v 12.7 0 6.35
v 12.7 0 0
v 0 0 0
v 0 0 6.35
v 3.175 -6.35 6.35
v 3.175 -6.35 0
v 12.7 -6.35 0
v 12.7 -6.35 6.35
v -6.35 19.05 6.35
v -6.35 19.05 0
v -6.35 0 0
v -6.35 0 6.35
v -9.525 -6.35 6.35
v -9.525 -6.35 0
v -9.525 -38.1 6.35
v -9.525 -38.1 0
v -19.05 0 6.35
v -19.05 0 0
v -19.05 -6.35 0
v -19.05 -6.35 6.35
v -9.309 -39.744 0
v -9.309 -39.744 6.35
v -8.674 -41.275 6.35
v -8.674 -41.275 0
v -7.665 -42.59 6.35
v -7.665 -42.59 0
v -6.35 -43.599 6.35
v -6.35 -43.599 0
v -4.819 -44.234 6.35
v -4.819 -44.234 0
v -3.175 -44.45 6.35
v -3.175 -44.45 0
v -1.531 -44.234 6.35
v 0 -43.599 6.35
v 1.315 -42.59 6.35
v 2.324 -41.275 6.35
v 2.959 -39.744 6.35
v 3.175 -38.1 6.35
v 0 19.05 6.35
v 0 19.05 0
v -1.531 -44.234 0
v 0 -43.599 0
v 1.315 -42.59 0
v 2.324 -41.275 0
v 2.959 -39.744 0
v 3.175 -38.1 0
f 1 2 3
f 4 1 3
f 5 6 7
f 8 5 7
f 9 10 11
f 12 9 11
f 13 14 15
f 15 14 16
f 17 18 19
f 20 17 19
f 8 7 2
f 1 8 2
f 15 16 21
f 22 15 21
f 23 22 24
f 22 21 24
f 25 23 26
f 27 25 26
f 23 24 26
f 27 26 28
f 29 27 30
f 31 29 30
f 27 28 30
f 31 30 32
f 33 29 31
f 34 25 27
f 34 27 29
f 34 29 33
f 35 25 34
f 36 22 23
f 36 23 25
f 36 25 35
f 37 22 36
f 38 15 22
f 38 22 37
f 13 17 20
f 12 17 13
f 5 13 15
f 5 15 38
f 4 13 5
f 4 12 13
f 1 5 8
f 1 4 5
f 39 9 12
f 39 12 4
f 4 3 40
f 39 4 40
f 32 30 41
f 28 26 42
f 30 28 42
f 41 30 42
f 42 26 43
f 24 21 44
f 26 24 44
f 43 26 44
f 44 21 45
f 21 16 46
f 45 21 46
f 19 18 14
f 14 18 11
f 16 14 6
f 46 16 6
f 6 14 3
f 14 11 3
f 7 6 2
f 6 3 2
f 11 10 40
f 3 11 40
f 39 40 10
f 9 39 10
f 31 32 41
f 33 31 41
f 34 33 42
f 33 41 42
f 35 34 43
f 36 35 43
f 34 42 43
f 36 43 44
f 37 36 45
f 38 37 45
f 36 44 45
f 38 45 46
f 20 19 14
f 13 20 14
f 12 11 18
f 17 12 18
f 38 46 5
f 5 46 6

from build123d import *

# Parameters (mm, degrees)
F1_DEPTH = 6.35


with BuildPart() as f1:
    # F0 (on Top) → F1 (new body)
    with BuildSketch(Plane.XY):
        with BuildLine():
            Line((0, 0), (0, 19.05))
            Line((0, 19.05), (-6.35, 19.05))
            Line((-6.35, 19.05), (-6.35, 0))
            Line((-6.35, 0), (-19.05, 0))
            Line((-19.05, 0), (-19.05, -6.35))
            Line((-19.05, -6.35), (-9.525, -6.35))
            Line((-9.525, -6.35), (-9.525, -38.1))
            ThreePointArc((-9.525, -38.1), (-7.665128, -42.590128), (-3.175, -44.45))
            ThreePointArc((-3.175, -44.45), (1.315128, -42.590128), (3.175, -38.1))
            Line((3.175, -38.1), (3.175, -6.35))
            Line((3.175, -6.35), (12.7, -6.35))
            Line((12.7, -6.35), (12.7, 0))
            Line((12.7, 0), (0, 0))
        make_face()
    extrude(amount=F1_DEPTH)


solid = f1.part
